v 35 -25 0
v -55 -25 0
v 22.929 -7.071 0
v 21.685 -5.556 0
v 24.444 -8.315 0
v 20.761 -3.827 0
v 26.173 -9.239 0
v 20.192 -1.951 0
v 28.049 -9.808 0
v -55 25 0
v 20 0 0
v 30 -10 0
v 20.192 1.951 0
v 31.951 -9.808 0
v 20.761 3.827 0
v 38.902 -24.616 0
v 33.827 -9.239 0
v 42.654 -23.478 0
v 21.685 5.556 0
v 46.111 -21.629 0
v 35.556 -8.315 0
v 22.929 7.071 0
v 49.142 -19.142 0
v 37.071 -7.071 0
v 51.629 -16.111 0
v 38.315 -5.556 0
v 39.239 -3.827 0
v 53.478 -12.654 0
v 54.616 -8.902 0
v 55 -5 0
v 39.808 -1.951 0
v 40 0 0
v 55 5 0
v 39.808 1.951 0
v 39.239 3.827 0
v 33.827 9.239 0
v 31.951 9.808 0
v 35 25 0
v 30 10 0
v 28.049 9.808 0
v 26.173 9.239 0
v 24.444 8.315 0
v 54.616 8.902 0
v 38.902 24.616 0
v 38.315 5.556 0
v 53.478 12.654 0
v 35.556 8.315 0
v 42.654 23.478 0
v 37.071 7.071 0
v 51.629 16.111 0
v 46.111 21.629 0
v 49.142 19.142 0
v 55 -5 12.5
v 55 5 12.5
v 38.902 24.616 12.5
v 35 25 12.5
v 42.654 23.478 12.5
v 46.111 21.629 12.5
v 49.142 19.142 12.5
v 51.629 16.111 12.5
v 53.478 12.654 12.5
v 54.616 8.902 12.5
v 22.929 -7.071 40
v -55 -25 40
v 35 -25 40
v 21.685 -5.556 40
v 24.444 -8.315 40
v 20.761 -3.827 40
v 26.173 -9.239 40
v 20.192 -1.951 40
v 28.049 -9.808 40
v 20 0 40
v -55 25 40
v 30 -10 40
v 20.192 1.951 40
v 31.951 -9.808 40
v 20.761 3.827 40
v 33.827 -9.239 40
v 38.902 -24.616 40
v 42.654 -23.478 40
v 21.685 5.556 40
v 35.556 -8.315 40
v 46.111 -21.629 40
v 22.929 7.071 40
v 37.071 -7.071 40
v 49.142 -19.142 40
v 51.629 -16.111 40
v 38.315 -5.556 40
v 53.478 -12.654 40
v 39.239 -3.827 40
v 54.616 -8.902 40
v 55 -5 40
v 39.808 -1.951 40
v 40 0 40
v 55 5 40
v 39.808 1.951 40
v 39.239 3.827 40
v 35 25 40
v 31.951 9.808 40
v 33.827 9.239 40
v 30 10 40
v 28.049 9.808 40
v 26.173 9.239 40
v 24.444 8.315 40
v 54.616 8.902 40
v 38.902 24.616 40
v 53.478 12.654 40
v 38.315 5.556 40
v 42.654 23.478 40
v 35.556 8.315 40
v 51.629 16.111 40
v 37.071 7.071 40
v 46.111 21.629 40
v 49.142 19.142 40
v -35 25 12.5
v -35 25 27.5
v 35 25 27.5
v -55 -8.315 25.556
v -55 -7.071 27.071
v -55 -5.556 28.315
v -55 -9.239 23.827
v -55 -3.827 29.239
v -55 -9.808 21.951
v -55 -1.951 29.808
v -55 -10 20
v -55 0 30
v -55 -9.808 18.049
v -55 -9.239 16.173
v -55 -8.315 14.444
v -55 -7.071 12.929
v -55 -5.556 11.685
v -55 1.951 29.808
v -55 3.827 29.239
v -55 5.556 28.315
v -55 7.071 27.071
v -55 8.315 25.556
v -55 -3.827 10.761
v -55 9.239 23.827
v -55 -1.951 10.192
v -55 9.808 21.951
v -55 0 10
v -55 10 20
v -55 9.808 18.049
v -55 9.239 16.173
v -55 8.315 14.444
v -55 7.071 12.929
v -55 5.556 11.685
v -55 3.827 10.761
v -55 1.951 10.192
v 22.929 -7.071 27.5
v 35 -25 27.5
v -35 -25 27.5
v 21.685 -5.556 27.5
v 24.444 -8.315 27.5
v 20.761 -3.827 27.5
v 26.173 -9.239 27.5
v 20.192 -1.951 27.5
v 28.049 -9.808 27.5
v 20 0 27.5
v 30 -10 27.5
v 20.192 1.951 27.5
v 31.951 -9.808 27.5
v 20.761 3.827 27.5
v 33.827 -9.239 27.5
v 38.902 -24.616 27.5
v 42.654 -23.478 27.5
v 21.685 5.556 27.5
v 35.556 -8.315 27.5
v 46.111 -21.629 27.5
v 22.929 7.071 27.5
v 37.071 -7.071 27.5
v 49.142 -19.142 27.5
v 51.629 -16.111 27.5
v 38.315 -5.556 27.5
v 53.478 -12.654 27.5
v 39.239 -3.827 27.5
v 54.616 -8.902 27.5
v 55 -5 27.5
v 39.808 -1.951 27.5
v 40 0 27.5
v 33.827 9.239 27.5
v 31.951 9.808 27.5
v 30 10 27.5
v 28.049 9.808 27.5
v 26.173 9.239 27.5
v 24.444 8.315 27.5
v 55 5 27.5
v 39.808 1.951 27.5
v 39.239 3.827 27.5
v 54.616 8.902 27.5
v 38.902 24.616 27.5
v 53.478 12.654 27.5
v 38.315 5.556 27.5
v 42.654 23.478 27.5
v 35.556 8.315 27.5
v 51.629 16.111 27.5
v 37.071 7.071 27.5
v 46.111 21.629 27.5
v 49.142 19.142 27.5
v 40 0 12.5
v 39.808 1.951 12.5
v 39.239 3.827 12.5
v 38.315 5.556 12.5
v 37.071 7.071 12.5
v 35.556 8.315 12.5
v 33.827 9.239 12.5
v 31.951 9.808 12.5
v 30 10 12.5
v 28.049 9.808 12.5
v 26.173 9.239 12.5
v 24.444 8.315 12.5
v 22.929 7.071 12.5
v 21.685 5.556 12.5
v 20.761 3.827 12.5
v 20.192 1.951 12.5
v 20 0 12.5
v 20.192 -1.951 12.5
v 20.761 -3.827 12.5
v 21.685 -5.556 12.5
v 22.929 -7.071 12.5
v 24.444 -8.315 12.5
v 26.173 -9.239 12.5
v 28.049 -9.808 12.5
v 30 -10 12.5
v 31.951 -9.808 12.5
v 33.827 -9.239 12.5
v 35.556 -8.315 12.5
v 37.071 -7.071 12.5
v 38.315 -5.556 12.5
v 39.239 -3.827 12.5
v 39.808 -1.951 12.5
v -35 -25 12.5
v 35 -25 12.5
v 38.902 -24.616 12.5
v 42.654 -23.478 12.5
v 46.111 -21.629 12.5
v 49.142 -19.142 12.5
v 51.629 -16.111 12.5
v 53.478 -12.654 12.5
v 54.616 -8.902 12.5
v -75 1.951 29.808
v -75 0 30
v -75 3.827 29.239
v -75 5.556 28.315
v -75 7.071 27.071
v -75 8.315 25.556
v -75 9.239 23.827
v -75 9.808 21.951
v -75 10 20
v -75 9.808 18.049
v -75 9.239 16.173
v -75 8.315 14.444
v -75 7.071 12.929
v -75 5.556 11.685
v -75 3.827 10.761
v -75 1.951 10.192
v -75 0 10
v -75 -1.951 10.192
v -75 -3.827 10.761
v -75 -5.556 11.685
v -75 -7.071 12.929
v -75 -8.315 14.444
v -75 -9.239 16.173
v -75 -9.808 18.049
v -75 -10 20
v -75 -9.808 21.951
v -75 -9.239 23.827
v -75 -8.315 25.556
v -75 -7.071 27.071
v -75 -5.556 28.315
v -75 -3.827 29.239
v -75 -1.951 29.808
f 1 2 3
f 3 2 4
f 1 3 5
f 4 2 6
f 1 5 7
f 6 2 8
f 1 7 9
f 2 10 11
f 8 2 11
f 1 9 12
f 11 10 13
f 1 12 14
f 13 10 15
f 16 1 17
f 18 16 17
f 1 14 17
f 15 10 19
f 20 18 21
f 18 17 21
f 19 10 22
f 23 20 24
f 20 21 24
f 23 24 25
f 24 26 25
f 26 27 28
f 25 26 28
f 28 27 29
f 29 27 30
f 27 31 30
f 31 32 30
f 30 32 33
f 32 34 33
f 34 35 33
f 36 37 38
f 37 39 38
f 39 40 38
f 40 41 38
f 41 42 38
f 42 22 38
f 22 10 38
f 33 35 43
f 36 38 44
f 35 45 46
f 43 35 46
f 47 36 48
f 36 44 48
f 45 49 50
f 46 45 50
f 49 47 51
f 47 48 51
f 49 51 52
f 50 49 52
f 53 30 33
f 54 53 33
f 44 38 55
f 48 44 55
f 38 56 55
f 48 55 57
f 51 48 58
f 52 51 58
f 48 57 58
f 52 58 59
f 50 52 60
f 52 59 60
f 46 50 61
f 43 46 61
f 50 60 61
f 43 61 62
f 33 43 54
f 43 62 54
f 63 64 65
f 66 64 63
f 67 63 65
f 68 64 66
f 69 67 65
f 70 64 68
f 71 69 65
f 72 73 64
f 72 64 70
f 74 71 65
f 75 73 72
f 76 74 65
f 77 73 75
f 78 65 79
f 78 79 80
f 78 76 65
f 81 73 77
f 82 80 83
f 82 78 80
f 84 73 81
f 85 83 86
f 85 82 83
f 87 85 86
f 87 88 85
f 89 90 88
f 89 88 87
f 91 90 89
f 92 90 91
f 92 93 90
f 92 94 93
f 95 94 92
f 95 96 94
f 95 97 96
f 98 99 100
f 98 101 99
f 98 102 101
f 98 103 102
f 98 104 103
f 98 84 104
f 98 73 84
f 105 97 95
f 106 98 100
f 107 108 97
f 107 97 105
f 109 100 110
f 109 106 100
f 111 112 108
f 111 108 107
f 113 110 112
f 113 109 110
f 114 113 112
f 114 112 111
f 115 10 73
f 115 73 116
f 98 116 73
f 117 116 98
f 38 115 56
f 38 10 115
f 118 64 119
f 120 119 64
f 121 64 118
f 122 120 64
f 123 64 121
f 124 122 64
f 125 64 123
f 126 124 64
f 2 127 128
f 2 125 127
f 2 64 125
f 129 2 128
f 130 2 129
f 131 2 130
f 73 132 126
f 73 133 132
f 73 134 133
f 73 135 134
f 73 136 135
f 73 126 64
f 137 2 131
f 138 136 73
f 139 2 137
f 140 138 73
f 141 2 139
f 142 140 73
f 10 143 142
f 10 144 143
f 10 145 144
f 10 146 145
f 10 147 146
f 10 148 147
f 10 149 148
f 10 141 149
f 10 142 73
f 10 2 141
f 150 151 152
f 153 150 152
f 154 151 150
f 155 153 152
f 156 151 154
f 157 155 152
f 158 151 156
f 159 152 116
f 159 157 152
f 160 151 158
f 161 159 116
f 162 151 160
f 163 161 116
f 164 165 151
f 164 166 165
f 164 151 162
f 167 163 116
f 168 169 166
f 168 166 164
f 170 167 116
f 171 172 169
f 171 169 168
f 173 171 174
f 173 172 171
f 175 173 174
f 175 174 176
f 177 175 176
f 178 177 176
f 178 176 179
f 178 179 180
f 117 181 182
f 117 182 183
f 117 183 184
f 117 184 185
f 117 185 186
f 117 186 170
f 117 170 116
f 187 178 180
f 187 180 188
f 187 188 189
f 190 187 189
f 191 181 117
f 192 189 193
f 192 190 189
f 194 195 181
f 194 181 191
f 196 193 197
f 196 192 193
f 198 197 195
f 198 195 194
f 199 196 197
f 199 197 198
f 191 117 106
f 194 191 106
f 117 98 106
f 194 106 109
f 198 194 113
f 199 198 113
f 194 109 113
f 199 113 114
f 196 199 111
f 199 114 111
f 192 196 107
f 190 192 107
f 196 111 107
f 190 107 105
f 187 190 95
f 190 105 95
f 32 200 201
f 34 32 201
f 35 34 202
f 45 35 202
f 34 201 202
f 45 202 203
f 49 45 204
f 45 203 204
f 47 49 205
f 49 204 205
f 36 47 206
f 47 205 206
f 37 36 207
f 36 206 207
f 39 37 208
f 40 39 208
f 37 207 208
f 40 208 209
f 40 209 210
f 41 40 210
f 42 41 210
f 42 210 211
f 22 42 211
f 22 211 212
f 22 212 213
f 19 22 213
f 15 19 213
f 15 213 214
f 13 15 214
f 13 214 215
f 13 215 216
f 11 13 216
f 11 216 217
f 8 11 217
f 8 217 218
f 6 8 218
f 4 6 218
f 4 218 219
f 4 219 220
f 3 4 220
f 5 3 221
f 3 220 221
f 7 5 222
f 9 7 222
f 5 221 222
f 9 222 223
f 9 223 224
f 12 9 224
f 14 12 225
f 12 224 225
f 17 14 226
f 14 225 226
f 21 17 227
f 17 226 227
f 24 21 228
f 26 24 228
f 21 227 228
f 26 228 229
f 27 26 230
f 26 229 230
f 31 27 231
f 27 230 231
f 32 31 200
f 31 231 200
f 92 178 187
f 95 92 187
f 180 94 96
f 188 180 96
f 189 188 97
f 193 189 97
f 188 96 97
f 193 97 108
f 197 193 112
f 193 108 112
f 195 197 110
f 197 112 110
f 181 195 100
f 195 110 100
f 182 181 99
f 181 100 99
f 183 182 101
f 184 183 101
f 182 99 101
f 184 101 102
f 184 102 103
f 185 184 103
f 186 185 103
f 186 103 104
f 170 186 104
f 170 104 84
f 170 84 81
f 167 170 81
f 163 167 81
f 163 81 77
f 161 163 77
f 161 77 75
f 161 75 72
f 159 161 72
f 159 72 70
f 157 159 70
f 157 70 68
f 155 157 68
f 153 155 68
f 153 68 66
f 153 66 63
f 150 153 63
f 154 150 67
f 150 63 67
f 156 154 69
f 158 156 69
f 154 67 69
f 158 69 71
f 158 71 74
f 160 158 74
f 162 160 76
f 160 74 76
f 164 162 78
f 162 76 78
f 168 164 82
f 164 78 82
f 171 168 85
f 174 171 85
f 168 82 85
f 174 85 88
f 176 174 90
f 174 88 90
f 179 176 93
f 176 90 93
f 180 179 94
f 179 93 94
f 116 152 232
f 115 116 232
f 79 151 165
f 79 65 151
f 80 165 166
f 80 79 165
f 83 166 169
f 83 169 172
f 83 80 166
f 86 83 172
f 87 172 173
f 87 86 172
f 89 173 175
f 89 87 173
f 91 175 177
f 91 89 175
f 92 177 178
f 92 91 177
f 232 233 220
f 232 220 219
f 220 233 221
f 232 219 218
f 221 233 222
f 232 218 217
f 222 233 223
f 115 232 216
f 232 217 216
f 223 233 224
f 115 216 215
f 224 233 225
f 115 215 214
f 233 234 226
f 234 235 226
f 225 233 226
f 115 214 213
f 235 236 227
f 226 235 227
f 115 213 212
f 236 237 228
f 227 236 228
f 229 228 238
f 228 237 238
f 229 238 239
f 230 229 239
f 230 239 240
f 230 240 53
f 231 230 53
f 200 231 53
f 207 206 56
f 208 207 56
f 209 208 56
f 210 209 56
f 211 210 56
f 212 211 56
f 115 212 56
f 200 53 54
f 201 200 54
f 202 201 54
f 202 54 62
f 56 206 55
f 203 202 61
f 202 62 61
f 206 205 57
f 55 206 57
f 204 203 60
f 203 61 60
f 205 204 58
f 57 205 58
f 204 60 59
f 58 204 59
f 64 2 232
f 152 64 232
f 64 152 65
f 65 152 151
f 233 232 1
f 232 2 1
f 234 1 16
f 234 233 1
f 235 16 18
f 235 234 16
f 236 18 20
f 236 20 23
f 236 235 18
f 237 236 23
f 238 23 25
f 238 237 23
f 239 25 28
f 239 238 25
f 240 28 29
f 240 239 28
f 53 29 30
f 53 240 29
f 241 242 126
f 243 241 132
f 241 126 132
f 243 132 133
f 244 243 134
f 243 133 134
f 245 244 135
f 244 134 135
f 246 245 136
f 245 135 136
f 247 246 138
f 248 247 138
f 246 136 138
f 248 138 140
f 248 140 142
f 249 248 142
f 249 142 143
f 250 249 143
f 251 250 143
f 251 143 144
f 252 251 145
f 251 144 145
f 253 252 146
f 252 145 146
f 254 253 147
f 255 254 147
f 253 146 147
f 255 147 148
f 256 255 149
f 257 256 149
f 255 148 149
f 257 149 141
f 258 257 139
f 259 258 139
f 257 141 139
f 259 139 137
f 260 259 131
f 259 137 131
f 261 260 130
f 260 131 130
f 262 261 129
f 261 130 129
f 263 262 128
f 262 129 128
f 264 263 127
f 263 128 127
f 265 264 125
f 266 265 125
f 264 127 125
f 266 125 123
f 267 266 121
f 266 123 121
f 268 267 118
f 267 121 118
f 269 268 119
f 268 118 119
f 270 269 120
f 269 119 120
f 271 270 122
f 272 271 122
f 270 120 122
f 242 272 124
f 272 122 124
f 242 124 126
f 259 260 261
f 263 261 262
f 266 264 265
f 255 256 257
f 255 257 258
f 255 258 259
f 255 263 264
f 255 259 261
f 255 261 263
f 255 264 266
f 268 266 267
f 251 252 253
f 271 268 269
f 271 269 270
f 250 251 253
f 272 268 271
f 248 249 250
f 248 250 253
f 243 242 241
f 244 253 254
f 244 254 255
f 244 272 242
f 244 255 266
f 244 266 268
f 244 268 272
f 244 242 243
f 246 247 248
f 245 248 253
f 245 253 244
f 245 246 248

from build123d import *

# Parameters (mm, degrees)
SKETCH1_W           = 110
SKETCH1_H           = 50
BOSS_EXTRUDE1_DEPTH = 40
SKETCH2_W           = 15
SKETCH2_H           = 50
CUT_EXTRUDE1_DEPTH  = 90
FILLET1_R           = 20
SKETCH3_R           = 10
CUT_EXTRUDE2_DEPTH  = 90
SKETCH4_R           = 10
BOSS_EXTRUDE2_DEPTH = 20


with BuildPart() as part:
    # Sketch1 → Boss-Extrude1 (new body)
    with BuildSketch(Plane.XY):
        Rectangle(SKETCH1_W, SKETCH1_H)
    extrude(amount=BOSS_EXTRUDE1_DEPTH)

    # Sketch2 → Cut-Extrude1 (cut)
    with BuildSketch(Plane(origin=(55, 0, 0), x_dir=(0, 0, -1), z_dir=(1, 0, 0))):
        with Locations((-20, 0)):
            Rectangle(SKETCH2_W, SKETCH2_H)
    extrude(amount=-CUT_EXTRUDE1_DEPTH, mode=Mode.SUBTRACT)

    # Fillet1
    fillet1_edges = [part.edges().sort_by_distance(p)[0] for p in [
        (55, -25, 6.25),
        (55, 25, 6.25),
        (55, -25, 33.75),
        (55, 25, 33.75),
    ]]
    fillet(fillet1_edges, radius=FILLET1_R)

    # Sketch3 → Cut-Extrude2 (cut)
    with BuildSketch(Plane.XY.offset(40)):
        with Locations((30, 0)):
            Circle(SKETCH3_R)
    extrude(amount=-CUT_EXTRUDE2_DEPTH, mode=Mode.SUBTRACT)

    # Sketch4 → Boss-Extrude2 (add)
    with BuildSketch(Plane.ZY.offset(55)):
        with Locations((20, 0)):
            Circle(SKETCH4_R)
    extrude(amount=BOSS_EXTRUDE2_DEPTH)


solid = part.part
